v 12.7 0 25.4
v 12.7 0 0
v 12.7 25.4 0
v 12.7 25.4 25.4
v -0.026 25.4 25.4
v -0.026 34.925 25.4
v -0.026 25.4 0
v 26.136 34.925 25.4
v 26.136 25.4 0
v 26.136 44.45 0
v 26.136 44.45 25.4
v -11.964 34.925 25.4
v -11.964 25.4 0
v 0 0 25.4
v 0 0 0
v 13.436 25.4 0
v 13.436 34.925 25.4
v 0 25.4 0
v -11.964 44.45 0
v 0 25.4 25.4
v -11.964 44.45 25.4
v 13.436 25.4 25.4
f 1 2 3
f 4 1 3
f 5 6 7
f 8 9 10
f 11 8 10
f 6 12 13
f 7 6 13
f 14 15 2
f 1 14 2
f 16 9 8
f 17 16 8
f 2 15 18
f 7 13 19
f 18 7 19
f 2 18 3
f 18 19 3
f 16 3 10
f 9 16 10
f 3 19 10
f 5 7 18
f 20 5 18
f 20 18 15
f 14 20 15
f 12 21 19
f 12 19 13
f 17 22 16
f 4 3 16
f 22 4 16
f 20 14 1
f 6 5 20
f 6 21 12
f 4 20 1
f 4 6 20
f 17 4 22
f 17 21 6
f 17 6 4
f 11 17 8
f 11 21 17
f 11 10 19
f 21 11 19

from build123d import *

# Parameters (mm, degrees)
F1_DEPTH = 25.4
F3_DEPTH = 11.938
F5_DEPTH = 12.7


with BuildPart() as f1:
    # F0 (on Top) → F1 (new body)
    with BuildSketch(Plane.XY):
        Polygon((0, 25.4), (0, 0), (12.699998, 0), (12.699998, 25.4), (26.136232, 25.4), (26.136232, 44.45), (-11.963768, 44.45), (-11.963768, 25.4), align=None)
    extrude(amount=F1_DEPTH)

    # F2 (on face) → F3 (cut)
    with BuildSketch(Plane(origin=(-11.963768, 0, 0), x_dir=(0, -1, 0), z_dir=(-1, 0, 0))):
        Polygon((-34.925, 25.4), (-25.4, 0), (-25.4, 25.4), align=None)
    extrude(amount=-F3_DEPTH, mode=Mode.SUBTRACT)

    # F4 (on face) → F5 (cut)
    with BuildSketch(Plane.YZ.offset(26.136232)):
        Polygon((25.4, 25.4), (25.4, 0), (34.925, 25.4), align=None)
    extrude(amount=-F5_DEPTH, mode=Mode.SUBTRACT)


solid = f1.part
